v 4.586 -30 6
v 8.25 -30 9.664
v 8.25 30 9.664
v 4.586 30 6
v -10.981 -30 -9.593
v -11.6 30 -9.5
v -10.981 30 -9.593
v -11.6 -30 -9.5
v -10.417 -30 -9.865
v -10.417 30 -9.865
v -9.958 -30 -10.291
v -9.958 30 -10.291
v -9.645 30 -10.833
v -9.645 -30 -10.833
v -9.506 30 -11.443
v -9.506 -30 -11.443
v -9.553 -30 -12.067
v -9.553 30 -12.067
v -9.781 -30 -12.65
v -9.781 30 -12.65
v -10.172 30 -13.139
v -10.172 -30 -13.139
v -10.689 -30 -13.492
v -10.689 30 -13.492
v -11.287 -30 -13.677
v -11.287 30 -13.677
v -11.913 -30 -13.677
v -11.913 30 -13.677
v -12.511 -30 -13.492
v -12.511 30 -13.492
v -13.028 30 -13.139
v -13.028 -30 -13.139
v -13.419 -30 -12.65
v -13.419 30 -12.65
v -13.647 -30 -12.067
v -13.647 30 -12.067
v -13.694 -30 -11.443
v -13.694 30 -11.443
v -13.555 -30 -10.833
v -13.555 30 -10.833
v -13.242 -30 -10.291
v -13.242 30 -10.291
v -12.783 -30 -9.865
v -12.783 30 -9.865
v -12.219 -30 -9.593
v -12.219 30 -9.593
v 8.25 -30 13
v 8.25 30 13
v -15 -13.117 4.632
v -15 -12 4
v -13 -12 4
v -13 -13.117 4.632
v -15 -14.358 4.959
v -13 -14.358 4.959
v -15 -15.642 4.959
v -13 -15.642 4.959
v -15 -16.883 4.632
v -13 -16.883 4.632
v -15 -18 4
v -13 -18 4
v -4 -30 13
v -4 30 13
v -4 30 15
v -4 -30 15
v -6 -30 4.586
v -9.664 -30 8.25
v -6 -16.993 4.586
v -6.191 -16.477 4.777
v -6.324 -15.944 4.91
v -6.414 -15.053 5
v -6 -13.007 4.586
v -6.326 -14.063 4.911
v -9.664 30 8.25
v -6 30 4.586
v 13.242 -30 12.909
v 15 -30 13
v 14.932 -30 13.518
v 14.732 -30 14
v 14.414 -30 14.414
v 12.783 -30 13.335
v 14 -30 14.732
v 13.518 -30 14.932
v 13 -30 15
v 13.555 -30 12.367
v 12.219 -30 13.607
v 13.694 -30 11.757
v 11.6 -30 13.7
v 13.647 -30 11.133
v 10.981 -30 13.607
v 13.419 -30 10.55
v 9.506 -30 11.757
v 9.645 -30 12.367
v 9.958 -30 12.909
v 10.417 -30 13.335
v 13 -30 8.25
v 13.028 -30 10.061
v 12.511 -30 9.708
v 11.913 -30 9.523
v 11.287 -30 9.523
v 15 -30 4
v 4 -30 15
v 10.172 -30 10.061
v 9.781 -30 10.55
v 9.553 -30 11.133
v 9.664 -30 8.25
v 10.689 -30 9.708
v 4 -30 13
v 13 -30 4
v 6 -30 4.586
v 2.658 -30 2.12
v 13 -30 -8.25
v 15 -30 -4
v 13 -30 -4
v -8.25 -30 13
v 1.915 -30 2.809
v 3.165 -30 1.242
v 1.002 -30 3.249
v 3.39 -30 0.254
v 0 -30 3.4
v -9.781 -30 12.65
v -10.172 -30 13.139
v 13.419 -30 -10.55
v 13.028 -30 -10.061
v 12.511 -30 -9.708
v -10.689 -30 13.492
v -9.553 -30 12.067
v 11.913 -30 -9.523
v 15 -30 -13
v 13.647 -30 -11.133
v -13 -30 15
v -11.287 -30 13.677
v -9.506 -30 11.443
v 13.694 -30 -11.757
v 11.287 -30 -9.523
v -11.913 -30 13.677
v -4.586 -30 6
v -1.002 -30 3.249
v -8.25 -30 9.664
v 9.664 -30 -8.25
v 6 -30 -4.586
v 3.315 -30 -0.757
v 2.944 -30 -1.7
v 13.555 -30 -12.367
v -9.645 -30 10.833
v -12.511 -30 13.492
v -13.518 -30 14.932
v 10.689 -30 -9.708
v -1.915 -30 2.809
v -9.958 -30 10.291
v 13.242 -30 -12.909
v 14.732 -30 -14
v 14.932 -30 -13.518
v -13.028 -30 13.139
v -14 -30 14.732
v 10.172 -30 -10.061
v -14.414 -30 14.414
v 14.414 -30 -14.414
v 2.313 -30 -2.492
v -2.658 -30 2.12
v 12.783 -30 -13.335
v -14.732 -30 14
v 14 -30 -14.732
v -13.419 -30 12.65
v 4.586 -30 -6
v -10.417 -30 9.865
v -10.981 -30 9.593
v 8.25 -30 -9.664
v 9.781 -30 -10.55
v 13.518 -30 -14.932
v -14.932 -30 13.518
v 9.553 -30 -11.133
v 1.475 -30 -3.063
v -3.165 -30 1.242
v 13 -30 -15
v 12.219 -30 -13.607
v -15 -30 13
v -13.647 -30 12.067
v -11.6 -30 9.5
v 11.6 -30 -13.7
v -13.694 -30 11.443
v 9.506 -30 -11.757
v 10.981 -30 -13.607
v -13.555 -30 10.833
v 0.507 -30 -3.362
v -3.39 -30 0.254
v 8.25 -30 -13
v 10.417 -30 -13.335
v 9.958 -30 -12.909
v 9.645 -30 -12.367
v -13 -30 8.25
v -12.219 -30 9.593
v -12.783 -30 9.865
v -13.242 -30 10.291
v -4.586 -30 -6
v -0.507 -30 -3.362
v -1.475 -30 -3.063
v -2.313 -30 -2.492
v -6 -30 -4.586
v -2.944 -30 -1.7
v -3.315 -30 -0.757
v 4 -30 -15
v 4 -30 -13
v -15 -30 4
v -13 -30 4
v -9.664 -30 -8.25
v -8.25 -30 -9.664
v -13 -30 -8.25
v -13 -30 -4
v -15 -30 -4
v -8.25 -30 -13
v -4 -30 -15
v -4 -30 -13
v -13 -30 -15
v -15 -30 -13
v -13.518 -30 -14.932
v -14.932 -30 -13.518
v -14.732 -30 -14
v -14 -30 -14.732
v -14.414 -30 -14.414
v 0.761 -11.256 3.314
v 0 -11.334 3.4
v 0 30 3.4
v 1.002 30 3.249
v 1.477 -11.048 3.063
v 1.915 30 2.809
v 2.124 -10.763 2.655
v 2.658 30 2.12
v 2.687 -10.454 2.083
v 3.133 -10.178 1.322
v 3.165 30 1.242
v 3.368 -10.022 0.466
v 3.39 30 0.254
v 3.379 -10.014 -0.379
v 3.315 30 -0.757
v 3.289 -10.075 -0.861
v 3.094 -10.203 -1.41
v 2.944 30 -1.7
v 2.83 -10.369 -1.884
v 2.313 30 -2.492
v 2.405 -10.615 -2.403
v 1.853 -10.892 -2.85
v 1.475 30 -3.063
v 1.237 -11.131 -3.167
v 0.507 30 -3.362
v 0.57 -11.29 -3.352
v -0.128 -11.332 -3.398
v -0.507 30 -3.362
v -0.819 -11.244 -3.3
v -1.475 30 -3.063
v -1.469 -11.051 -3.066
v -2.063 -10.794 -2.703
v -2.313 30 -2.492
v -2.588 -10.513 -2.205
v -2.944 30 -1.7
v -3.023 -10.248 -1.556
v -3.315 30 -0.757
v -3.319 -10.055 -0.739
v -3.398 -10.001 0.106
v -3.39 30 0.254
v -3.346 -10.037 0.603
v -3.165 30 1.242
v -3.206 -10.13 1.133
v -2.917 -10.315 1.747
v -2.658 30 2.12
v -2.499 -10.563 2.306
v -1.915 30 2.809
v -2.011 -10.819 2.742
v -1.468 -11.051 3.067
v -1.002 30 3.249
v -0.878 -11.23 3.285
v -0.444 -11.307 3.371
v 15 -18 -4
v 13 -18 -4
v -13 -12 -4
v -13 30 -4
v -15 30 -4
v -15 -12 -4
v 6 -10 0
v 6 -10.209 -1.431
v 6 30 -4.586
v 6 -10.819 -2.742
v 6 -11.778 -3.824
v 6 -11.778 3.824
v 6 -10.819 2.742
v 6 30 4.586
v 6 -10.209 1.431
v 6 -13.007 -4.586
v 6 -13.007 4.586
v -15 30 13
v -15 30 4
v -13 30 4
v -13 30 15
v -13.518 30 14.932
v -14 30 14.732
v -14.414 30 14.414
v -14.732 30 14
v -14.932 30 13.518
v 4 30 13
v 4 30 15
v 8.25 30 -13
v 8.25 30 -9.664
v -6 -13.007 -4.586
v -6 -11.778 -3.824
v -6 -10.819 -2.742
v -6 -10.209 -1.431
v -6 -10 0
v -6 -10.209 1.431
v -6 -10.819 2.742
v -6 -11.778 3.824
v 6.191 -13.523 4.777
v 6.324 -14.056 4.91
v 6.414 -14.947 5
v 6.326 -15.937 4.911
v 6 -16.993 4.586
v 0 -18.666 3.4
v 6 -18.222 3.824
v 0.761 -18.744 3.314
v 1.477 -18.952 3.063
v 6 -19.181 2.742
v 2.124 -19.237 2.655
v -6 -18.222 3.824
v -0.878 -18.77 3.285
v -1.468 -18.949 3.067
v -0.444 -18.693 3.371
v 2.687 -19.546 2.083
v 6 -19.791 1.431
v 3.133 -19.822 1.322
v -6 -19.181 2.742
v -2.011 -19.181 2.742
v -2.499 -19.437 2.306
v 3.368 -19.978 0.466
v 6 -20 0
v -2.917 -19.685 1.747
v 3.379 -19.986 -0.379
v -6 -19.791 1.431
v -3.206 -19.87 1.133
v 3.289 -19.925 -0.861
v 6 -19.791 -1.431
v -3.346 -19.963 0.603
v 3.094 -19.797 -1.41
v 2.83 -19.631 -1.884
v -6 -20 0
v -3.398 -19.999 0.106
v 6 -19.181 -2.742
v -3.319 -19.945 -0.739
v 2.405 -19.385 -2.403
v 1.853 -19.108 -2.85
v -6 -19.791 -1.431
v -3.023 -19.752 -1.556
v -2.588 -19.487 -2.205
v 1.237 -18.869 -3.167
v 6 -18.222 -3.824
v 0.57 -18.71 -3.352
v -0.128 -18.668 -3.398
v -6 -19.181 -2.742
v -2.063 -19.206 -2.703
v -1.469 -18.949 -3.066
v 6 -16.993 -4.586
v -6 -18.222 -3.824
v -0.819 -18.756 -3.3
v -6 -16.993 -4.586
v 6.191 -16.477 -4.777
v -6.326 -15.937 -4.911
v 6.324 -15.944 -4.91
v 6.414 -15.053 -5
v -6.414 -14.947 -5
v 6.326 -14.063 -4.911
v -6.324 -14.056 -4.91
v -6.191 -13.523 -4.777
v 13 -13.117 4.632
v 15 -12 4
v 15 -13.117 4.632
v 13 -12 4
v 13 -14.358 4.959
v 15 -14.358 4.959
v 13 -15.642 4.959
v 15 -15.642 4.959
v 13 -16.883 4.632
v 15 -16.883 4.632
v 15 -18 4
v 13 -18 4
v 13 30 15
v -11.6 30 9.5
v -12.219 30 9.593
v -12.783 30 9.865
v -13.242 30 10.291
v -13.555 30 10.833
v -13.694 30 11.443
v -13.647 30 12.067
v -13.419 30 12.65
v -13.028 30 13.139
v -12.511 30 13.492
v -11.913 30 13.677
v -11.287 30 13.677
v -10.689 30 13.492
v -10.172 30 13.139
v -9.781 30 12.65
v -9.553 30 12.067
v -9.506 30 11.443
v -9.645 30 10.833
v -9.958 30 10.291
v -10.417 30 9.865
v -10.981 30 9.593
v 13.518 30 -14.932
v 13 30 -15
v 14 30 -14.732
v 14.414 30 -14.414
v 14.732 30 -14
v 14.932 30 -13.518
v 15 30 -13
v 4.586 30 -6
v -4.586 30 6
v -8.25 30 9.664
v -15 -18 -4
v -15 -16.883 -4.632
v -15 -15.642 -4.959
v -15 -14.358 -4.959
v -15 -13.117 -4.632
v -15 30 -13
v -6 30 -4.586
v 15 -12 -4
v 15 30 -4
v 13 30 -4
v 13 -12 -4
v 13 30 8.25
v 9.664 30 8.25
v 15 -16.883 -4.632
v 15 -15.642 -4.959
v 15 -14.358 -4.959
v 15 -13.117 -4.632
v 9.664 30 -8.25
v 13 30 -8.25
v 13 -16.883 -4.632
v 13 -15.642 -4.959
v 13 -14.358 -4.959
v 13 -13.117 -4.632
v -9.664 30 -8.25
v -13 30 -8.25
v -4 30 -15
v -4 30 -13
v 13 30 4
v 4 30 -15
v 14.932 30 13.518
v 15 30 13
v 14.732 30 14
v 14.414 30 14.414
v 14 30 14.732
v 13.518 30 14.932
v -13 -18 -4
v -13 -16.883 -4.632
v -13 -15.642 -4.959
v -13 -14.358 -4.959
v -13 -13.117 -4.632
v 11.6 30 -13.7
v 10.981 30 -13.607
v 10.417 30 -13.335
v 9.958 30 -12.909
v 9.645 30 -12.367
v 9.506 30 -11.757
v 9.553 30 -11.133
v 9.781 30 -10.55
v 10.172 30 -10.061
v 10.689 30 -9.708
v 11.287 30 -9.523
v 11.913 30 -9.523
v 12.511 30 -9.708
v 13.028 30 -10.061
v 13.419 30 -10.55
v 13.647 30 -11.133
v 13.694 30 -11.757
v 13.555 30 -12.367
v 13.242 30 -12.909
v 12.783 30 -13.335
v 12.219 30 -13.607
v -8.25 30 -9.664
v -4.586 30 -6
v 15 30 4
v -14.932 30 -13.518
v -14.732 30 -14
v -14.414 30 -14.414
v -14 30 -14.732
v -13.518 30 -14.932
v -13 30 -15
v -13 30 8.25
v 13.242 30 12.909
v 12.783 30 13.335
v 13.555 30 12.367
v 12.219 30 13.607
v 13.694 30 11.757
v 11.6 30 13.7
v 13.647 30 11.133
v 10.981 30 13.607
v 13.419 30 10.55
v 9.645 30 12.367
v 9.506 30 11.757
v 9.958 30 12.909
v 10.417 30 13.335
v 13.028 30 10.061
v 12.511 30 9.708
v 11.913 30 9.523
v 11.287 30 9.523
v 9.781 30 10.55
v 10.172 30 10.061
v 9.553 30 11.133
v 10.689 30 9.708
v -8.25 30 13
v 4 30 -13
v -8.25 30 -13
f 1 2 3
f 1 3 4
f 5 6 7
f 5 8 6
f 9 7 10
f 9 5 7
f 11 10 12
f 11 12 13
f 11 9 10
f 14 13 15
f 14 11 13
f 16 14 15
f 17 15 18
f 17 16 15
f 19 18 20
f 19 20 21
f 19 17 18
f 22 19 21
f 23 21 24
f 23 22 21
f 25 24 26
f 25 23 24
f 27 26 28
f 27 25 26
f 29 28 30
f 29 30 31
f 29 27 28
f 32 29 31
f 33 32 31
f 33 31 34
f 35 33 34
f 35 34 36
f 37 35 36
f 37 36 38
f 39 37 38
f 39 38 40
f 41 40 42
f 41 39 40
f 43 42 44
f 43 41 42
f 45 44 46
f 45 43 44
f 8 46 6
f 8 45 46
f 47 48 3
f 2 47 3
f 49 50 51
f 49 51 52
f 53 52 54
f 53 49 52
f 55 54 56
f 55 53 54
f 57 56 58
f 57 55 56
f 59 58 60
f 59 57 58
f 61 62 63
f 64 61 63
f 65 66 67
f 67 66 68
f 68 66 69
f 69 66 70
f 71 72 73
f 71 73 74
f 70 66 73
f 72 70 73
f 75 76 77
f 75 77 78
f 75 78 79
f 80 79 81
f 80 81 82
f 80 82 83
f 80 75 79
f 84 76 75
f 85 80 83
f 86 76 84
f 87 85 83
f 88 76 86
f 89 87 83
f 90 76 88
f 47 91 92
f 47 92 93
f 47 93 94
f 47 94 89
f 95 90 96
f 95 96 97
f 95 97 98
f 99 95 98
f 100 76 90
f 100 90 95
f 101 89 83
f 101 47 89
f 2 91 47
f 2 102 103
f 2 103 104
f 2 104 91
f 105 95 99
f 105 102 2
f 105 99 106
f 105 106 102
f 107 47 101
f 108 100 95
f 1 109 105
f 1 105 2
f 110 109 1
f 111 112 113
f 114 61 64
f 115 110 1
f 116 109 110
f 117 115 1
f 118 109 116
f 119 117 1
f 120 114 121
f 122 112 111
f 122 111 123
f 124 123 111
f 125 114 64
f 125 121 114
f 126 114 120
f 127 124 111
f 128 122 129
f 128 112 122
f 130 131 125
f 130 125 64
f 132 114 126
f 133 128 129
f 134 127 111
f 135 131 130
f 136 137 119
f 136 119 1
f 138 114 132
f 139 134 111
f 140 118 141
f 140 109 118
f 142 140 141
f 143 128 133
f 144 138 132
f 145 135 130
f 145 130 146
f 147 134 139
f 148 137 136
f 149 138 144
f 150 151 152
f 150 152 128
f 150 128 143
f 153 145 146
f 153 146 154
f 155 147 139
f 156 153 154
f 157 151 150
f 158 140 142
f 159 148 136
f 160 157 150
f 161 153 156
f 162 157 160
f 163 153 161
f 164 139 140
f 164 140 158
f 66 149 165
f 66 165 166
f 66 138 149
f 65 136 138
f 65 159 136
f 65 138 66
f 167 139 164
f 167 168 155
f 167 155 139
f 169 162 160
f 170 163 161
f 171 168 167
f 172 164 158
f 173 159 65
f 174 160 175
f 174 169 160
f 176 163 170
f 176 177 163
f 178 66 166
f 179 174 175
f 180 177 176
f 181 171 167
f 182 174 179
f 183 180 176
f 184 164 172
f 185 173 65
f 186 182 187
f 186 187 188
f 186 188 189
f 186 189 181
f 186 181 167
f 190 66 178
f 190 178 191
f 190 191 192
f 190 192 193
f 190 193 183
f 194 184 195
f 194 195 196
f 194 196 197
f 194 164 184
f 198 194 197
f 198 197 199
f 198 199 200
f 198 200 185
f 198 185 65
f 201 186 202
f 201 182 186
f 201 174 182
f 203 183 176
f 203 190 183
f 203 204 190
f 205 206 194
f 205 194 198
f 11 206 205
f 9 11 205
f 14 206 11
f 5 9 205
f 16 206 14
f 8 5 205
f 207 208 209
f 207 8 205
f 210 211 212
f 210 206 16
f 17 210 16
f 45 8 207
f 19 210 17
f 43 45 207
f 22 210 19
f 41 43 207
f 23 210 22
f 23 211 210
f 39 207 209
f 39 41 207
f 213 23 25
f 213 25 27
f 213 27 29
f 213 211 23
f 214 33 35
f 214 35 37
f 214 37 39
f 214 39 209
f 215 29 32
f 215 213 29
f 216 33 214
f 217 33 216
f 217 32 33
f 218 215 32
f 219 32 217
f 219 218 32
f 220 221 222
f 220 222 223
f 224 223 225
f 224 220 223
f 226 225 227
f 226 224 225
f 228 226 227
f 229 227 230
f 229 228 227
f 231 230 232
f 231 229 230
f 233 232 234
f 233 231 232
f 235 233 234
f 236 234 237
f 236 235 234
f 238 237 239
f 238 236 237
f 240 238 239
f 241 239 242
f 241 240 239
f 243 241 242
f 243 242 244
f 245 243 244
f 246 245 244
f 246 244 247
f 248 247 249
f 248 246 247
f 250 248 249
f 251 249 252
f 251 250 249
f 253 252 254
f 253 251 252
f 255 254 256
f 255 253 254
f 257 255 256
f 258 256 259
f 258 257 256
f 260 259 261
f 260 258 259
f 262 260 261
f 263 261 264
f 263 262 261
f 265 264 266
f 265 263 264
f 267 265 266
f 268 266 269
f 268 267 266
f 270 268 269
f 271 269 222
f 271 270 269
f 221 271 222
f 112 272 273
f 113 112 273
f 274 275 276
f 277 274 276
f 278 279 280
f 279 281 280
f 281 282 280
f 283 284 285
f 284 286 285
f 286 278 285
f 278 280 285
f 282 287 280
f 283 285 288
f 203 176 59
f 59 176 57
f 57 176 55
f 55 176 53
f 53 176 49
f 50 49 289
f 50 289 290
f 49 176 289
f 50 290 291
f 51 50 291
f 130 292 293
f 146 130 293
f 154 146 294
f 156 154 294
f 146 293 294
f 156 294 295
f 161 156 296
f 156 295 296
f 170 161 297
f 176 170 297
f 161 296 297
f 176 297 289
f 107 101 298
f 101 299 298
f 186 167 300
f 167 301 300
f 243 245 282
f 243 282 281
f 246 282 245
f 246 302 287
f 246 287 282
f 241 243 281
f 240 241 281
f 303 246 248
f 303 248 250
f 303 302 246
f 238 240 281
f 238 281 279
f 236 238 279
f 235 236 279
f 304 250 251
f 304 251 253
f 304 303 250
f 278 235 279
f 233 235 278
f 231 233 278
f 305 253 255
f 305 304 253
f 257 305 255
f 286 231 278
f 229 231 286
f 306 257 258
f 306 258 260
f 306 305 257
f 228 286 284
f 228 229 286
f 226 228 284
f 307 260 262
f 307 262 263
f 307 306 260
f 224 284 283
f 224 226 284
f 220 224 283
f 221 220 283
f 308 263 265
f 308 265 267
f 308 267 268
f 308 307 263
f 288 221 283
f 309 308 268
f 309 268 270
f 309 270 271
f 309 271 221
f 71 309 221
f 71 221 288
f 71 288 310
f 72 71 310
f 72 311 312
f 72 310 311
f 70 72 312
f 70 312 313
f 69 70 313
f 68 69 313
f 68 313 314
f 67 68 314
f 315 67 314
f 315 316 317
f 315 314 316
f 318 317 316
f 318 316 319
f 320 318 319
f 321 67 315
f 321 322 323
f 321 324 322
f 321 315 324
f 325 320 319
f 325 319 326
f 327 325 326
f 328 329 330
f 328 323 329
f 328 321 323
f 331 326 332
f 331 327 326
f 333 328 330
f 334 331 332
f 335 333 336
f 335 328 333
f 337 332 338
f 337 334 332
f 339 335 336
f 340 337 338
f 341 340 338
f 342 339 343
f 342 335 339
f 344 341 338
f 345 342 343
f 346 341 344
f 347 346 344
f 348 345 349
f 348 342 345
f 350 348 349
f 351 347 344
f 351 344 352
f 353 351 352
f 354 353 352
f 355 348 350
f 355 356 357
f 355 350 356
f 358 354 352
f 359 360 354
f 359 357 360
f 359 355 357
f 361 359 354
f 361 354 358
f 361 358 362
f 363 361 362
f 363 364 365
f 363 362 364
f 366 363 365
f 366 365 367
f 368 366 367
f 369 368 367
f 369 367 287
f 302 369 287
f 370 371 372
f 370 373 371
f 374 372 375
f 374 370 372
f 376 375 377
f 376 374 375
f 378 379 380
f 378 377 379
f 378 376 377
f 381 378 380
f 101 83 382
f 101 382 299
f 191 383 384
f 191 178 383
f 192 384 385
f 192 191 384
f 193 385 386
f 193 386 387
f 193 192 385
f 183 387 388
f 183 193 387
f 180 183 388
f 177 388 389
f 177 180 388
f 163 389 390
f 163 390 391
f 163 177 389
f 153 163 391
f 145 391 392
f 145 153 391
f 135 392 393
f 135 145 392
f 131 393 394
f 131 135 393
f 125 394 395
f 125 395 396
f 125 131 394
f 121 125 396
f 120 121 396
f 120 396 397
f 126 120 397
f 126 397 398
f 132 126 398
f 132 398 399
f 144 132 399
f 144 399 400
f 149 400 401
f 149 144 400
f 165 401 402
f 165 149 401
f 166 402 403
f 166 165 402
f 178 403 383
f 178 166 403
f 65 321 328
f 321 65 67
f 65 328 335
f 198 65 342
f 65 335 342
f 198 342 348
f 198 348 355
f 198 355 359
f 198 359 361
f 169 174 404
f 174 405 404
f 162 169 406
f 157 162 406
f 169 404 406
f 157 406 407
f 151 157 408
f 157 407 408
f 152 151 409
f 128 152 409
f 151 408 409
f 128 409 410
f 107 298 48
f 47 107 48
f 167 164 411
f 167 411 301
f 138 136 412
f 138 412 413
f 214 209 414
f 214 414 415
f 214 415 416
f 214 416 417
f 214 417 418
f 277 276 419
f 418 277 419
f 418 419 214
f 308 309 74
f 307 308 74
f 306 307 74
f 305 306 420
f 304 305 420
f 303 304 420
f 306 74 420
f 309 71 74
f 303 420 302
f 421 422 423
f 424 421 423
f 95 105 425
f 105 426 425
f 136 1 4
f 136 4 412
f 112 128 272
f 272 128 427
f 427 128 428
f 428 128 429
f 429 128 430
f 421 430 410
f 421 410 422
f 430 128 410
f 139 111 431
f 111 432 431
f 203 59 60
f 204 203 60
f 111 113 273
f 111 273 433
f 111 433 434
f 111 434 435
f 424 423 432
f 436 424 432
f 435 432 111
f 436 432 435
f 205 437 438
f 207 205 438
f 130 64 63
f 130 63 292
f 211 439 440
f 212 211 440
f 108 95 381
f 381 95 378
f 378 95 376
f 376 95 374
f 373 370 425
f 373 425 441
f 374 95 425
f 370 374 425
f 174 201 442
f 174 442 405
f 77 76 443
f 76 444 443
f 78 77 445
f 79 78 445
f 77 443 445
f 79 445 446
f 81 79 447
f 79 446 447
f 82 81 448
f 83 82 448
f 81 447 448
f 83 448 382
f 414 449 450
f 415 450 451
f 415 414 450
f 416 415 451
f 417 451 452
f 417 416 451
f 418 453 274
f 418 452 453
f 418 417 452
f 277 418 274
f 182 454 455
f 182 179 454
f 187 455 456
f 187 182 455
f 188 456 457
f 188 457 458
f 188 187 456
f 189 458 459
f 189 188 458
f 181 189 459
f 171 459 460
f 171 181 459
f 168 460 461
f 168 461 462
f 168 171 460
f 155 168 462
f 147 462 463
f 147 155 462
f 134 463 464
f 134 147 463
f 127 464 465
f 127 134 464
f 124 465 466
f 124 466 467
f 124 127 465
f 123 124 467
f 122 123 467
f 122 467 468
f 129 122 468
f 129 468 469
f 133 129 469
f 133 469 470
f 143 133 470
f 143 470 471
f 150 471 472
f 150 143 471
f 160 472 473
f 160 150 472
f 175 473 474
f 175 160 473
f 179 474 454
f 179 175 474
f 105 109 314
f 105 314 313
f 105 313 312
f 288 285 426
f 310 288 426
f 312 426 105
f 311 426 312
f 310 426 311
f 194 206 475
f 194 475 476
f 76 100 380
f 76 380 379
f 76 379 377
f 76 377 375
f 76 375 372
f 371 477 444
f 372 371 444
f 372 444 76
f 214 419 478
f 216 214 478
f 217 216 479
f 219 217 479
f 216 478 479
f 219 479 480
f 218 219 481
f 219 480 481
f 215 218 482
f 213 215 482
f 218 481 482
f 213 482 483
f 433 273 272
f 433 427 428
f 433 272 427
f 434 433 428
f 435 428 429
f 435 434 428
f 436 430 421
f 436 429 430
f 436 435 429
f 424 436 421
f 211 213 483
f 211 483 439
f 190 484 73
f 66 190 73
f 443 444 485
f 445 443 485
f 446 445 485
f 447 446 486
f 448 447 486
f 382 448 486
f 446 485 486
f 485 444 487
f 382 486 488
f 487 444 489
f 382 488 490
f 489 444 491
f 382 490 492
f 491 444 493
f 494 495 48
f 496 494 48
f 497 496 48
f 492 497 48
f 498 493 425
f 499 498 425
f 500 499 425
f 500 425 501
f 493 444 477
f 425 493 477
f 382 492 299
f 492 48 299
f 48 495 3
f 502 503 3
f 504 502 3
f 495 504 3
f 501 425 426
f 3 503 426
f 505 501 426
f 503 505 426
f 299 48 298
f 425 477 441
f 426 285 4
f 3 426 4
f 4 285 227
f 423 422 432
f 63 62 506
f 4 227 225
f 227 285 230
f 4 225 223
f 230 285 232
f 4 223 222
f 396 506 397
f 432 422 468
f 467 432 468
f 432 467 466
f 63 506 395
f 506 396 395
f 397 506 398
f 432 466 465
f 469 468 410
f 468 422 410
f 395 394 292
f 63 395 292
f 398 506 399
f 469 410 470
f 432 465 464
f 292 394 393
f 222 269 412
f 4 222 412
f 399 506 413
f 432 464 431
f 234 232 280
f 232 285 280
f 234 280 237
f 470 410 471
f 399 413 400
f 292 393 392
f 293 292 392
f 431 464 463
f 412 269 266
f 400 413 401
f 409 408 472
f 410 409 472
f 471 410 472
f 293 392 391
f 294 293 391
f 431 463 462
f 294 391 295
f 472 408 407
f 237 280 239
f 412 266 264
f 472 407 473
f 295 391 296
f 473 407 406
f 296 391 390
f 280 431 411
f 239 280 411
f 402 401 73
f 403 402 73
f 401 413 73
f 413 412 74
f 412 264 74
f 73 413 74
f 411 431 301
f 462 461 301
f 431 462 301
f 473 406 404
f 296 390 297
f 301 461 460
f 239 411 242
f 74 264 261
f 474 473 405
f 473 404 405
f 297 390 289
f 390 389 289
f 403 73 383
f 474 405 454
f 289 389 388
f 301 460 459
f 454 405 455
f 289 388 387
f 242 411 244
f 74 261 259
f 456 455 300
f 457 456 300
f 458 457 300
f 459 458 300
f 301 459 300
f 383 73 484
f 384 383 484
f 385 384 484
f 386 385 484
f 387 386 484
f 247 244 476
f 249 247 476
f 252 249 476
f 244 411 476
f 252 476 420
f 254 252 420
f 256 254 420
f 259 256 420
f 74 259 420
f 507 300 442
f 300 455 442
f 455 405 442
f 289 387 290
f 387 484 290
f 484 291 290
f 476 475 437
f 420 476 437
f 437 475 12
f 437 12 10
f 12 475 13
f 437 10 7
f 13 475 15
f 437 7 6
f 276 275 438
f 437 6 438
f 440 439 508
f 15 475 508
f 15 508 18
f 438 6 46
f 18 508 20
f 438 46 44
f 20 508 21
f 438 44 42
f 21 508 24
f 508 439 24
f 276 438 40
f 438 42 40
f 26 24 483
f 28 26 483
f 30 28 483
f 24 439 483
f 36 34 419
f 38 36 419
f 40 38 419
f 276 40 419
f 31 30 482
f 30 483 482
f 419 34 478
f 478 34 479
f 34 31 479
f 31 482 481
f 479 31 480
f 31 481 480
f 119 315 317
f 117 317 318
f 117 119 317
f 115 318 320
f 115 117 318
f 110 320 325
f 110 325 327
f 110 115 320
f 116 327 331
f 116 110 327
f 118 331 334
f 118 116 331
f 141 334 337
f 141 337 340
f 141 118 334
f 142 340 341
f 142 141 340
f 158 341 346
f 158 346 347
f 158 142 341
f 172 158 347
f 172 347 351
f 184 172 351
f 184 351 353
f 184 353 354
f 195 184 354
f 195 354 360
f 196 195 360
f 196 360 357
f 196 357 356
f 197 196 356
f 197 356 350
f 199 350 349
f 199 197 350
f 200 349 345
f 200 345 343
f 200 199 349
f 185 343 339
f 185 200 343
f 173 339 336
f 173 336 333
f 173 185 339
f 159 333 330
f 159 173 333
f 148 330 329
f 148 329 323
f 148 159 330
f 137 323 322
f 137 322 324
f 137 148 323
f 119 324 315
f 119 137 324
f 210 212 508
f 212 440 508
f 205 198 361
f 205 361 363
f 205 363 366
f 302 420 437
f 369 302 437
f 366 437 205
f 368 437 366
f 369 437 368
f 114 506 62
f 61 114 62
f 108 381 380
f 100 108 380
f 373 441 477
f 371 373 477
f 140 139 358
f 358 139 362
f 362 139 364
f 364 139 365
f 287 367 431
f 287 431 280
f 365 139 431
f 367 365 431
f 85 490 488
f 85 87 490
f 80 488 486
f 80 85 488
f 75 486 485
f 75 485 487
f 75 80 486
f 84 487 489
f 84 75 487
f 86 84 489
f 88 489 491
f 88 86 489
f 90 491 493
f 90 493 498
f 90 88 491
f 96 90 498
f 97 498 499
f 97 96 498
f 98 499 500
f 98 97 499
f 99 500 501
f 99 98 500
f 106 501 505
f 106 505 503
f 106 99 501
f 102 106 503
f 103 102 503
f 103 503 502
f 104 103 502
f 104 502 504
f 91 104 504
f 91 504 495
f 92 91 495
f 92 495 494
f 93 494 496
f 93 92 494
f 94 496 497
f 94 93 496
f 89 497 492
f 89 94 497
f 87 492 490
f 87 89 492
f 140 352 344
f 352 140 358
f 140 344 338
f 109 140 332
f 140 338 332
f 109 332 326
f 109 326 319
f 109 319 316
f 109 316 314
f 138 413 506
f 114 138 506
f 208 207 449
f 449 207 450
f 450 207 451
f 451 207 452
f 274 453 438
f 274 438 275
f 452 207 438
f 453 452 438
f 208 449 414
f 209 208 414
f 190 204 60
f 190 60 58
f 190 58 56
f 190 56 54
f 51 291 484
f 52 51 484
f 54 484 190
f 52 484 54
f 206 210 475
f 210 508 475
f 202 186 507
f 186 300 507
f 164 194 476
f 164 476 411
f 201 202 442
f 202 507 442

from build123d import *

# Parameters (mm, degrees)
SKETCH1_R               = 2.1
SKETCH1_R_2             = 3.4
PROFILE_LENGTH_DEPTH    = 30
CUT_EXTRUDE1_DEPTH      = 37.742346142
CUT_EXTRUDE1_DEPTH_BACK = 37.742346142
SKETCH2_R               = 5


with BuildPart() as part:
    # Sketch1 → profile length (new, symmetric)
    with BuildSketch(Plane(origin=(0, 0, 0), x_dir=(1, 0, 0), z_dir=(0, 1, 0))):
        with BuildLine():
            Line((-4, 15), (-4, 13))
            Line((-4, 13), (-8.25, 13))
            Line((-8.25, 13), (-8.25, 9.664213562))
            Line((-8.25, 9.664213562), (-4.585786438, 6))
            Line((-4.585786438, 6), (4.585786438, 6))
            Line((4.585786438, 6), (8.25, 9.664213562))
            Line((8.25, 9.664213562), (8.25, 13))
            Line((8.25, 13), (4, 13))
            Line((4, 13), (4, 15))
            Line((4, 15), (13, 15))
            ThreePointArc((13, 15), (14.414213562, 14.414213562), (15, 13))
            Line((15, 13), (15, 4))
            Line((15, 4), (13, 4))
            Line((13, 4), (13, 8.25))
            Line((13, 8.25), (9.664213562, 8.25))
            Line((9.664213562, 8.25), (6, 4.585786438))
            Line((6, 4.585786438), (6, -4.585786438))
            Line((6, -4.585786438), (9.664213562, -8.25))
            Line((9.664213562, -8.25), (13, -8.25))
            Line((13, -8.25), (13, -4))
            Line((13, -4), (15, -4))
            Line((15, -4), (15, -13))
            ThreePointArc((15, -13), (14.414213562, -14.414213562), (13, -15))
            Line((13, -15), (4, -15))
            Line((4, -15), (4, -13))
            Line((4, -13), (8.25, -13))
            Line((8.25, -13), (8.25, -9.664213562))
            Line((8.25, -9.664213562), (4.585786438, -6))
            Line((4.585786438, -6), (-4.585786438, -6))
            Line((-4.585786438, -6), (-8.25, -9.664213562))
            Line((-8.25, -9.664213562), (-8.25, -13))
            Line((-8.25, -13), (-4, -13))
            Line((-4, -13), (-4, -15))
            Line((-4, -15), (-13, -15))
            ThreePointArc((-13, -15), (-14.414213562, -14.414213562), (-15, -13))
            Line((-15, -13), (-15, -4))
            Line((-15, -4), (-13, -4))
            Line((-13, -4), (-13, -8.25))
            Line((-13, -8.25), (-9.664213562, -8.25))
            Line((-9.664213562, -8.25), (-6, -4.585786438))
            Line((-6, -4.585786438), (-6, 4.585786438))
            Line((-6, 4.585786438), (-9.664213562, 8.25))
            Line((-9.664213562, 8.25), (-13, 8.25))
            Line((-13, 8.25), (-13, 4))
            Line((-13, 4), (-15, 4))
            Line((-15, 4), (-15, 13))
            ThreePointArc((-15, 13), (-14.414213562, 14.414213562), (-13, 15))
            Line((-13, 15), (-4, 15))
        make_face()
        with Locations(Location((-11.6, 11.6, 0), (0, 0, 270))):
            Circle(SKETCH1_R, mode=Mode.SUBTRACT)
        with Locations(Location((11.6, 11.6, 0), (0, 0, 90))):
            Circle(SKETCH1_R, mode=Mode.SUBTRACT)
        with Locations(Location((11.6, -11.6, 0), (0, 0, 270))):
            Circle(SKETCH1_R, mode=Mode.SUBTRACT)
        with Locations(Location((-11.6, -11.6, 0), (0, 0, 90))):
            Circle(SKETCH1_R, mode=Mode.SUBTRACT)
        with Locations(Location((0, 0, 0), (0, 0, 270))):
            Circle(SKETCH1_R_2, mode=Mode.SUBTRACT)
    extrude(amount=PROFILE_LENGTH_DEPTH, both=True)

    # Sketch2 → Cut-Extrude1 (cut, two sides: drawn at the far end of the back side and taken through both)
    with BuildSketch(Plane(origin=(0, 0, 0), x_dir=(0, 0, -1), z_dir=(1, 0, 0)).offset(-CUT_EXTRUDE1_DEPTH_BACK)):
        with Locations(Location((0, -15, 0), (0, 0, 23.486027641))):
            Circle(SKETCH2_R)
    extrude(amount=CUT_EXTRUDE1_DEPTH + CUT_EXTRUDE1_DEPTH_BACK, mode=Mode.SUBTRACT)


solid = part.part
